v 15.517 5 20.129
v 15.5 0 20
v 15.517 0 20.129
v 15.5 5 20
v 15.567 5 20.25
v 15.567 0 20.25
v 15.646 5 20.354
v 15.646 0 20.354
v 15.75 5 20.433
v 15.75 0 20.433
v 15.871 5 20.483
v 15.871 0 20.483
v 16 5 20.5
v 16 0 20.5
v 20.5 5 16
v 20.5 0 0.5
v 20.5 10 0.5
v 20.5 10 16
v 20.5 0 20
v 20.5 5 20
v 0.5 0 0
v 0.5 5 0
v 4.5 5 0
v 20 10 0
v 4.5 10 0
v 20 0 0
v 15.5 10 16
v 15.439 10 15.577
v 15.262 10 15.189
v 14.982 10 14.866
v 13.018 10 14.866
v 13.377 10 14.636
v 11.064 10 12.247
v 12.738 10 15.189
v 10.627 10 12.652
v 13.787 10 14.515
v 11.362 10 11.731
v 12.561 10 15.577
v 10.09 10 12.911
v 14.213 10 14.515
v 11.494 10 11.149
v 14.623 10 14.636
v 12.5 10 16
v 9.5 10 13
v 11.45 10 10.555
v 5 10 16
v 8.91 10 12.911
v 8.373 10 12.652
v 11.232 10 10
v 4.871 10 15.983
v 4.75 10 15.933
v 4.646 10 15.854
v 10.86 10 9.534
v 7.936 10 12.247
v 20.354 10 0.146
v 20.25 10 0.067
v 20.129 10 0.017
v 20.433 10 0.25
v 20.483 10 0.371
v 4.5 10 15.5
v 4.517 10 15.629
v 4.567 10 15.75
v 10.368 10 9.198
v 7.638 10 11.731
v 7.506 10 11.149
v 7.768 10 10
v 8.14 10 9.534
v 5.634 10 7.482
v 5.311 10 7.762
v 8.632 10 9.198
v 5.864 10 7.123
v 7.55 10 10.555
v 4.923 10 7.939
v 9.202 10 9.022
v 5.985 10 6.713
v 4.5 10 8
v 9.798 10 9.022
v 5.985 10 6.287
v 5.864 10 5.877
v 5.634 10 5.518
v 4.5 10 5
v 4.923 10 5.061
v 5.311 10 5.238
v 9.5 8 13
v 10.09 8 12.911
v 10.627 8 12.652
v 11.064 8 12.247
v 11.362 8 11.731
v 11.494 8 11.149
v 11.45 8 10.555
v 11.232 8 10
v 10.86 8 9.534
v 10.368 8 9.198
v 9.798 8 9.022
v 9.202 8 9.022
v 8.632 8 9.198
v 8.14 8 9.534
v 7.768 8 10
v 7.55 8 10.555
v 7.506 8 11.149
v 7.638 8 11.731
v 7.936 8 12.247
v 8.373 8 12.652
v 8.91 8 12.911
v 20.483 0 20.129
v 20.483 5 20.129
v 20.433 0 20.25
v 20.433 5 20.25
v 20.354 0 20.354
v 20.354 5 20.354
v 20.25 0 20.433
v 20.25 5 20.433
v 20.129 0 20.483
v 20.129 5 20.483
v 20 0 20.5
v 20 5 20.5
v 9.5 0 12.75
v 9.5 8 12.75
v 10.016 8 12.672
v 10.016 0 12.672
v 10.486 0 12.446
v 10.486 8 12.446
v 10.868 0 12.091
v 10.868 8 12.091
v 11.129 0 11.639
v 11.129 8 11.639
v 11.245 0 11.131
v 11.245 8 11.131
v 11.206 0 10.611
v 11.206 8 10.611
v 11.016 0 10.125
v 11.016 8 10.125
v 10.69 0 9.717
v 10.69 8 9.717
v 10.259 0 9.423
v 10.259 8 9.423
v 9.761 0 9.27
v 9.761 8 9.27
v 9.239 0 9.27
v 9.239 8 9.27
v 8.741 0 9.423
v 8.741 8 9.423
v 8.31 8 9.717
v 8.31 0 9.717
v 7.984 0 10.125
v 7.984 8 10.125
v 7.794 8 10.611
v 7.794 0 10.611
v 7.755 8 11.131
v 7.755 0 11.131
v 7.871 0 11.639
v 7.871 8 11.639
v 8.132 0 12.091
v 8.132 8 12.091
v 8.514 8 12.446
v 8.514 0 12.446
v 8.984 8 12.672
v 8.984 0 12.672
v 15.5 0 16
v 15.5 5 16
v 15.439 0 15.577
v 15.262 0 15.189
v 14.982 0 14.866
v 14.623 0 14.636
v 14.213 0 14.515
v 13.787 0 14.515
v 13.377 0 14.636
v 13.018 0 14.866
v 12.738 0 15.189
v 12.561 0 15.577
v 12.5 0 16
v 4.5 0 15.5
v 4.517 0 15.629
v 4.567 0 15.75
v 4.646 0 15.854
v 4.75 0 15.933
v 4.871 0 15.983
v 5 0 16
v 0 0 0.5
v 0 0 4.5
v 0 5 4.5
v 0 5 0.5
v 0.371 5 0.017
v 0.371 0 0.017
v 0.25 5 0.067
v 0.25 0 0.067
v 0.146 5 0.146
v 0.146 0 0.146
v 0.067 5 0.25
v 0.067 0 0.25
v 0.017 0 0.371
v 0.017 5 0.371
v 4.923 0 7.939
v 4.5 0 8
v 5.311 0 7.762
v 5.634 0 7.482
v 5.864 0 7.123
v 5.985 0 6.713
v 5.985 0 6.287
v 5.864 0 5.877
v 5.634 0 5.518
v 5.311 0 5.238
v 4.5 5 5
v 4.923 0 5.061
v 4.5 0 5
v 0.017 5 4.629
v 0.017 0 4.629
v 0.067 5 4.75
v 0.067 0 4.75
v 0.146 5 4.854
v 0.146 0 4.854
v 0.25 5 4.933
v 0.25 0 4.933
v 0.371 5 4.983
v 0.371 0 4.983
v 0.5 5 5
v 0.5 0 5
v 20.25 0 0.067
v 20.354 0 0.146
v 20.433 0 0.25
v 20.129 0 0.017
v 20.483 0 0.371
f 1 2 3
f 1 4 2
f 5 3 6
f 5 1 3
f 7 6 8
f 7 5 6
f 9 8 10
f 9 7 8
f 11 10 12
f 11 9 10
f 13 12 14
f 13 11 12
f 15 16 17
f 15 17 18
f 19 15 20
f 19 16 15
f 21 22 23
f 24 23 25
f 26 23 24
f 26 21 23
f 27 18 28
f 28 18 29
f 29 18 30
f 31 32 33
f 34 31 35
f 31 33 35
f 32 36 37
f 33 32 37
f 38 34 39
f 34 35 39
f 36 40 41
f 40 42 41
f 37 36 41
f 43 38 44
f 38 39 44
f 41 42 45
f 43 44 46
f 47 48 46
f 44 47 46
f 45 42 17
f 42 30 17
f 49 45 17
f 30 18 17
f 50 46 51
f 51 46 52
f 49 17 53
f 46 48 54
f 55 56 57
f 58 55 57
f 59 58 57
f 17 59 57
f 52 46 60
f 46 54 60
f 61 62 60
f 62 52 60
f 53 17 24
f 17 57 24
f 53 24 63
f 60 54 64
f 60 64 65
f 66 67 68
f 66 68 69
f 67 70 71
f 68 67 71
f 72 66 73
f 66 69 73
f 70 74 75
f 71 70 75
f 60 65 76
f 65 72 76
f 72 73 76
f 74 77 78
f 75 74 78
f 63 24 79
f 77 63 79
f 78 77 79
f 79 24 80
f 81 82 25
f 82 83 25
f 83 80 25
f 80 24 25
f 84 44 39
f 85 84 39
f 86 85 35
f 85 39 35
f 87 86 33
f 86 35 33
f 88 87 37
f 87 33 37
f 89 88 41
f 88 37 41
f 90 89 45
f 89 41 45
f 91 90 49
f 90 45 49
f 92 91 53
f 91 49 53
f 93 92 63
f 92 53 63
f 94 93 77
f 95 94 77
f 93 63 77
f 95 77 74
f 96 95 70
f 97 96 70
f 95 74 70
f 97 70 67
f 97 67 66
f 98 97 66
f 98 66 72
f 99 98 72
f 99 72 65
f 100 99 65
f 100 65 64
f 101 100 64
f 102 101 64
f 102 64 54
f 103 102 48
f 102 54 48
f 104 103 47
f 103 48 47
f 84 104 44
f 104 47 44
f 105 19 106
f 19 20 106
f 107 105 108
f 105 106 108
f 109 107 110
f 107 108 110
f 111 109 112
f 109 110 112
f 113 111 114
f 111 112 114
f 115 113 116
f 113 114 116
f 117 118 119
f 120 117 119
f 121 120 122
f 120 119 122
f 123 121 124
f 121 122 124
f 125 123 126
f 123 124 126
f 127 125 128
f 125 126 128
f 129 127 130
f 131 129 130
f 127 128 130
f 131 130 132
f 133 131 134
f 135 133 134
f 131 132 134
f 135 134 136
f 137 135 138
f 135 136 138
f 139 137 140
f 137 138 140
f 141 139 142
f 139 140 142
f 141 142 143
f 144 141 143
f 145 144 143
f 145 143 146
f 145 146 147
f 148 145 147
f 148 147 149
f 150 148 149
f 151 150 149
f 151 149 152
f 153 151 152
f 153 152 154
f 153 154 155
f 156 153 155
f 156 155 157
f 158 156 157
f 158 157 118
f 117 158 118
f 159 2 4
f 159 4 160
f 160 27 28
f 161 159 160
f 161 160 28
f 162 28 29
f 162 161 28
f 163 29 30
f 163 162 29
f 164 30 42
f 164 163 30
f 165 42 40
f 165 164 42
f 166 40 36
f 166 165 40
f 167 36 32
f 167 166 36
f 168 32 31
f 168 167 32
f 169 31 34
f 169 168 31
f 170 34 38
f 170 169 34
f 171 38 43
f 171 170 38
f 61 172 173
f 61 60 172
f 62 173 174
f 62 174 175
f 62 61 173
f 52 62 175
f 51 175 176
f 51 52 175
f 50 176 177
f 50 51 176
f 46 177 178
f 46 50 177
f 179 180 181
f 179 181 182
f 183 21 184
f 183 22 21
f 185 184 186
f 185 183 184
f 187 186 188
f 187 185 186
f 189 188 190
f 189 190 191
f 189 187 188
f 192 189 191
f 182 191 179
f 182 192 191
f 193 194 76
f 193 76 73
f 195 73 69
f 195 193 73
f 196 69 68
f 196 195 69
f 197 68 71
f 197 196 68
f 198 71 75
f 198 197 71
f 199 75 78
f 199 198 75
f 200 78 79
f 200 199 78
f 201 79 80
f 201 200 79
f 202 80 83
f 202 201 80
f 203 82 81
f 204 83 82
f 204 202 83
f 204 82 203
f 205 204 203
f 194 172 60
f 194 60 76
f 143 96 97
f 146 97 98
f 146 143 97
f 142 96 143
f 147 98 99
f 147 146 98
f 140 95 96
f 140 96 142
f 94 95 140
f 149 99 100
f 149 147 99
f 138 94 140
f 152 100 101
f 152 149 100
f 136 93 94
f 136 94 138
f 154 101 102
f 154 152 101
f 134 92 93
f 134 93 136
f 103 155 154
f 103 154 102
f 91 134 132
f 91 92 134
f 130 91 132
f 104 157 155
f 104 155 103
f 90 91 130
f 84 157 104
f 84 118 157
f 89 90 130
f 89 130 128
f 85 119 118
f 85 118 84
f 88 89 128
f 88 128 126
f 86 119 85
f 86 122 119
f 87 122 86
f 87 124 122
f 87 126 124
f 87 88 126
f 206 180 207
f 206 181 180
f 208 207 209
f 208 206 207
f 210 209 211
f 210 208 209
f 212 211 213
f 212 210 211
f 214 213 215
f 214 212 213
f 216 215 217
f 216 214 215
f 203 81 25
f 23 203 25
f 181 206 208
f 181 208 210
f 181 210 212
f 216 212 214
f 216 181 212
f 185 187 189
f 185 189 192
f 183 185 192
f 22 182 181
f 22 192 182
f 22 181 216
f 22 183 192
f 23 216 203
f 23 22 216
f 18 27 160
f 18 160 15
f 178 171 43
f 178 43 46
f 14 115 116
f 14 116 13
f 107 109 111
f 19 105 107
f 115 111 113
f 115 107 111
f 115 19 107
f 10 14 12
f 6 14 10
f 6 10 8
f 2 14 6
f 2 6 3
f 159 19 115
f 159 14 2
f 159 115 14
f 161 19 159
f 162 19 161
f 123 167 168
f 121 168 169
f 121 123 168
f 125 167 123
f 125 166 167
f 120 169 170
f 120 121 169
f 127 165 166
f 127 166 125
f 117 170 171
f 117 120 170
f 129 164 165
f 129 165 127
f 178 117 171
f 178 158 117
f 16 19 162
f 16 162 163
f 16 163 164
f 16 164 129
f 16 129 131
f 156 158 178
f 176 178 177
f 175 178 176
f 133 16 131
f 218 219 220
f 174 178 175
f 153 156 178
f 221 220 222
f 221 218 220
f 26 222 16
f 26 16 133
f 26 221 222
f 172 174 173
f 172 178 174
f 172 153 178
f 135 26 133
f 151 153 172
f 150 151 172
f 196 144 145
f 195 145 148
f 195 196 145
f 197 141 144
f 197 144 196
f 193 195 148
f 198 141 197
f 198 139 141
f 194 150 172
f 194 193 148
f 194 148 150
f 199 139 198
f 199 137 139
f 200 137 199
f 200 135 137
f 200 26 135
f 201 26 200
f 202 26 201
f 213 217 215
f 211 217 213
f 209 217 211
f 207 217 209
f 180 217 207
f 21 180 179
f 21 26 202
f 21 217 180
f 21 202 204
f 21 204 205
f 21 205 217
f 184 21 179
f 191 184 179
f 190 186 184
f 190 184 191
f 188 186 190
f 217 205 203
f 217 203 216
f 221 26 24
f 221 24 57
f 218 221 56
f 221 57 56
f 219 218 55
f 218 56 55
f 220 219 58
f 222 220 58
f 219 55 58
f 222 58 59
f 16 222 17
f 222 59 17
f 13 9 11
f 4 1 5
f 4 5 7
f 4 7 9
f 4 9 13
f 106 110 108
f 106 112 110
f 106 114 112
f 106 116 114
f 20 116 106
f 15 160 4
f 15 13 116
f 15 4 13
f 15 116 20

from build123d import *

# Parameters (mm, degrees)
BOSS_EXTRUDE1_DEPTH = 10
SKETCH4_R           = 1.75
CUT_EXTRUDE3_DEPTH  = 10
SKETCH6_R           = 2
CUT_EXTRUDE5_DEPTH  = 2
CUT_EXTRUDE6_DEPTH  = 31.66757245
SKETCH8_W           = 5
SKETCH8_H           = 4.5
SKETCH8_W_2         = 4.5
SKETCH8_H_2         = 5
CUT_EXTRUDE7_DEPTH  = 5
FILLET1_R           = 0.5


with BuildPart() as part:
    # Sketch1 → Boss-Extrude1 (new body)
    with BuildSketch(Plane(origin=(0, 0, 0), x_dir=(1, 0, 0), z_dir=(0, 1, 0))):
        Polygon((0, 0), (20.5, 0), (20.5, -20.5), (15.5, -20.5), (15.5, -16), (4.5, -16), (4.5, -5), (0, -5), align=None)
    extrude(amount=BOSS_EXTRUDE1_DEPTH)

    # Sketch4 → Cut-Extrude3 (cut)
    with BuildSketch(Plane(origin=(0, 10, 0), x_dir=(1, 0, 0), z_dir=(0, 1, 0))):
        with Locations(Location((9.5, -11, 0), (0, 0, 270))):
            Circle(SKETCH4_R)
    extrude(amount=-CUT_EXTRUDE3_DEPTH, mode=Mode.SUBTRACT)

    # Sketch6 → Cut-Extrude5 (cut)
    with BuildSketch(Plane(origin=(0, 10, 0), x_dir=(1, 0, 0), z_dir=(0, 1, 0))):
        with Locations(Location((9.5, -11, 0), (0, 0, 270))):
            Circle(SKETCH6_R)
    extrude(amount=-CUT_EXTRUDE5_DEPTH, mode=Mode.SUBTRACT)

    # Sketch7 → Cut-Extrude6 (cut, through all)
    with BuildSketch(Plane.XZ):
        with BuildLine():
            Line((0, 8), (4.5, 8))
            ThreePointArc((4.5, 8), (6, 6.5), (4.5, 5))
            Line((4.5, 5), (0, 5))
            ThreePointArc((0, 5), (-1.5, 6.5), (0, 8))
        make_face()
        with BuildLine():
            Line((12.5, 16), (12.5, 20.5))
            ThreePointArc((12.5, 20.5), (14, 22), (15.5, 20.5))
            Line((15.5, 20.5), (15.5, 16))
            ThreePointArc((15.5, 16), (14, 14.5), (12.5, 16))
        make_face()
    extrude(amount=-CUT_EXTRUDE6_DEPTH, mode=Mode.SUBTRACT)

    # Sketch8 → Cut-Extrude7 (cut)
    with BuildSketch(Plane(origin=(0, 10, 0), x_dir=(1, 0, 0), z_dir=(0, 1, 0))):
        with Locations((18, -18.25)):
            Rectangle(SKETCH8_W, SKETCH8_H)
        with Locations((2.25, -2.5)):
            Rectangle(SKETCH8_W_2, SKETCH8_H_2)
    extrude(amount=-CUT_EXTRUDE7_DEPTH, mode=Mode.SUBTRACT)

    # Fillet1
    fillet1_edges = [part.edges().sort_by_distance(p)[0] for p in [
        (4.5, 5, 16),
        (20.5, 5, 0),
        (20.5, 2.5, 20.5),
        (15.5, 2.5, 20.5),
        (0, 2.5, 5),
        (0, 2.5, 0),
    ]]
    fillet(fillet1_edges, radius=FILLET1_R)


solid = part.part
